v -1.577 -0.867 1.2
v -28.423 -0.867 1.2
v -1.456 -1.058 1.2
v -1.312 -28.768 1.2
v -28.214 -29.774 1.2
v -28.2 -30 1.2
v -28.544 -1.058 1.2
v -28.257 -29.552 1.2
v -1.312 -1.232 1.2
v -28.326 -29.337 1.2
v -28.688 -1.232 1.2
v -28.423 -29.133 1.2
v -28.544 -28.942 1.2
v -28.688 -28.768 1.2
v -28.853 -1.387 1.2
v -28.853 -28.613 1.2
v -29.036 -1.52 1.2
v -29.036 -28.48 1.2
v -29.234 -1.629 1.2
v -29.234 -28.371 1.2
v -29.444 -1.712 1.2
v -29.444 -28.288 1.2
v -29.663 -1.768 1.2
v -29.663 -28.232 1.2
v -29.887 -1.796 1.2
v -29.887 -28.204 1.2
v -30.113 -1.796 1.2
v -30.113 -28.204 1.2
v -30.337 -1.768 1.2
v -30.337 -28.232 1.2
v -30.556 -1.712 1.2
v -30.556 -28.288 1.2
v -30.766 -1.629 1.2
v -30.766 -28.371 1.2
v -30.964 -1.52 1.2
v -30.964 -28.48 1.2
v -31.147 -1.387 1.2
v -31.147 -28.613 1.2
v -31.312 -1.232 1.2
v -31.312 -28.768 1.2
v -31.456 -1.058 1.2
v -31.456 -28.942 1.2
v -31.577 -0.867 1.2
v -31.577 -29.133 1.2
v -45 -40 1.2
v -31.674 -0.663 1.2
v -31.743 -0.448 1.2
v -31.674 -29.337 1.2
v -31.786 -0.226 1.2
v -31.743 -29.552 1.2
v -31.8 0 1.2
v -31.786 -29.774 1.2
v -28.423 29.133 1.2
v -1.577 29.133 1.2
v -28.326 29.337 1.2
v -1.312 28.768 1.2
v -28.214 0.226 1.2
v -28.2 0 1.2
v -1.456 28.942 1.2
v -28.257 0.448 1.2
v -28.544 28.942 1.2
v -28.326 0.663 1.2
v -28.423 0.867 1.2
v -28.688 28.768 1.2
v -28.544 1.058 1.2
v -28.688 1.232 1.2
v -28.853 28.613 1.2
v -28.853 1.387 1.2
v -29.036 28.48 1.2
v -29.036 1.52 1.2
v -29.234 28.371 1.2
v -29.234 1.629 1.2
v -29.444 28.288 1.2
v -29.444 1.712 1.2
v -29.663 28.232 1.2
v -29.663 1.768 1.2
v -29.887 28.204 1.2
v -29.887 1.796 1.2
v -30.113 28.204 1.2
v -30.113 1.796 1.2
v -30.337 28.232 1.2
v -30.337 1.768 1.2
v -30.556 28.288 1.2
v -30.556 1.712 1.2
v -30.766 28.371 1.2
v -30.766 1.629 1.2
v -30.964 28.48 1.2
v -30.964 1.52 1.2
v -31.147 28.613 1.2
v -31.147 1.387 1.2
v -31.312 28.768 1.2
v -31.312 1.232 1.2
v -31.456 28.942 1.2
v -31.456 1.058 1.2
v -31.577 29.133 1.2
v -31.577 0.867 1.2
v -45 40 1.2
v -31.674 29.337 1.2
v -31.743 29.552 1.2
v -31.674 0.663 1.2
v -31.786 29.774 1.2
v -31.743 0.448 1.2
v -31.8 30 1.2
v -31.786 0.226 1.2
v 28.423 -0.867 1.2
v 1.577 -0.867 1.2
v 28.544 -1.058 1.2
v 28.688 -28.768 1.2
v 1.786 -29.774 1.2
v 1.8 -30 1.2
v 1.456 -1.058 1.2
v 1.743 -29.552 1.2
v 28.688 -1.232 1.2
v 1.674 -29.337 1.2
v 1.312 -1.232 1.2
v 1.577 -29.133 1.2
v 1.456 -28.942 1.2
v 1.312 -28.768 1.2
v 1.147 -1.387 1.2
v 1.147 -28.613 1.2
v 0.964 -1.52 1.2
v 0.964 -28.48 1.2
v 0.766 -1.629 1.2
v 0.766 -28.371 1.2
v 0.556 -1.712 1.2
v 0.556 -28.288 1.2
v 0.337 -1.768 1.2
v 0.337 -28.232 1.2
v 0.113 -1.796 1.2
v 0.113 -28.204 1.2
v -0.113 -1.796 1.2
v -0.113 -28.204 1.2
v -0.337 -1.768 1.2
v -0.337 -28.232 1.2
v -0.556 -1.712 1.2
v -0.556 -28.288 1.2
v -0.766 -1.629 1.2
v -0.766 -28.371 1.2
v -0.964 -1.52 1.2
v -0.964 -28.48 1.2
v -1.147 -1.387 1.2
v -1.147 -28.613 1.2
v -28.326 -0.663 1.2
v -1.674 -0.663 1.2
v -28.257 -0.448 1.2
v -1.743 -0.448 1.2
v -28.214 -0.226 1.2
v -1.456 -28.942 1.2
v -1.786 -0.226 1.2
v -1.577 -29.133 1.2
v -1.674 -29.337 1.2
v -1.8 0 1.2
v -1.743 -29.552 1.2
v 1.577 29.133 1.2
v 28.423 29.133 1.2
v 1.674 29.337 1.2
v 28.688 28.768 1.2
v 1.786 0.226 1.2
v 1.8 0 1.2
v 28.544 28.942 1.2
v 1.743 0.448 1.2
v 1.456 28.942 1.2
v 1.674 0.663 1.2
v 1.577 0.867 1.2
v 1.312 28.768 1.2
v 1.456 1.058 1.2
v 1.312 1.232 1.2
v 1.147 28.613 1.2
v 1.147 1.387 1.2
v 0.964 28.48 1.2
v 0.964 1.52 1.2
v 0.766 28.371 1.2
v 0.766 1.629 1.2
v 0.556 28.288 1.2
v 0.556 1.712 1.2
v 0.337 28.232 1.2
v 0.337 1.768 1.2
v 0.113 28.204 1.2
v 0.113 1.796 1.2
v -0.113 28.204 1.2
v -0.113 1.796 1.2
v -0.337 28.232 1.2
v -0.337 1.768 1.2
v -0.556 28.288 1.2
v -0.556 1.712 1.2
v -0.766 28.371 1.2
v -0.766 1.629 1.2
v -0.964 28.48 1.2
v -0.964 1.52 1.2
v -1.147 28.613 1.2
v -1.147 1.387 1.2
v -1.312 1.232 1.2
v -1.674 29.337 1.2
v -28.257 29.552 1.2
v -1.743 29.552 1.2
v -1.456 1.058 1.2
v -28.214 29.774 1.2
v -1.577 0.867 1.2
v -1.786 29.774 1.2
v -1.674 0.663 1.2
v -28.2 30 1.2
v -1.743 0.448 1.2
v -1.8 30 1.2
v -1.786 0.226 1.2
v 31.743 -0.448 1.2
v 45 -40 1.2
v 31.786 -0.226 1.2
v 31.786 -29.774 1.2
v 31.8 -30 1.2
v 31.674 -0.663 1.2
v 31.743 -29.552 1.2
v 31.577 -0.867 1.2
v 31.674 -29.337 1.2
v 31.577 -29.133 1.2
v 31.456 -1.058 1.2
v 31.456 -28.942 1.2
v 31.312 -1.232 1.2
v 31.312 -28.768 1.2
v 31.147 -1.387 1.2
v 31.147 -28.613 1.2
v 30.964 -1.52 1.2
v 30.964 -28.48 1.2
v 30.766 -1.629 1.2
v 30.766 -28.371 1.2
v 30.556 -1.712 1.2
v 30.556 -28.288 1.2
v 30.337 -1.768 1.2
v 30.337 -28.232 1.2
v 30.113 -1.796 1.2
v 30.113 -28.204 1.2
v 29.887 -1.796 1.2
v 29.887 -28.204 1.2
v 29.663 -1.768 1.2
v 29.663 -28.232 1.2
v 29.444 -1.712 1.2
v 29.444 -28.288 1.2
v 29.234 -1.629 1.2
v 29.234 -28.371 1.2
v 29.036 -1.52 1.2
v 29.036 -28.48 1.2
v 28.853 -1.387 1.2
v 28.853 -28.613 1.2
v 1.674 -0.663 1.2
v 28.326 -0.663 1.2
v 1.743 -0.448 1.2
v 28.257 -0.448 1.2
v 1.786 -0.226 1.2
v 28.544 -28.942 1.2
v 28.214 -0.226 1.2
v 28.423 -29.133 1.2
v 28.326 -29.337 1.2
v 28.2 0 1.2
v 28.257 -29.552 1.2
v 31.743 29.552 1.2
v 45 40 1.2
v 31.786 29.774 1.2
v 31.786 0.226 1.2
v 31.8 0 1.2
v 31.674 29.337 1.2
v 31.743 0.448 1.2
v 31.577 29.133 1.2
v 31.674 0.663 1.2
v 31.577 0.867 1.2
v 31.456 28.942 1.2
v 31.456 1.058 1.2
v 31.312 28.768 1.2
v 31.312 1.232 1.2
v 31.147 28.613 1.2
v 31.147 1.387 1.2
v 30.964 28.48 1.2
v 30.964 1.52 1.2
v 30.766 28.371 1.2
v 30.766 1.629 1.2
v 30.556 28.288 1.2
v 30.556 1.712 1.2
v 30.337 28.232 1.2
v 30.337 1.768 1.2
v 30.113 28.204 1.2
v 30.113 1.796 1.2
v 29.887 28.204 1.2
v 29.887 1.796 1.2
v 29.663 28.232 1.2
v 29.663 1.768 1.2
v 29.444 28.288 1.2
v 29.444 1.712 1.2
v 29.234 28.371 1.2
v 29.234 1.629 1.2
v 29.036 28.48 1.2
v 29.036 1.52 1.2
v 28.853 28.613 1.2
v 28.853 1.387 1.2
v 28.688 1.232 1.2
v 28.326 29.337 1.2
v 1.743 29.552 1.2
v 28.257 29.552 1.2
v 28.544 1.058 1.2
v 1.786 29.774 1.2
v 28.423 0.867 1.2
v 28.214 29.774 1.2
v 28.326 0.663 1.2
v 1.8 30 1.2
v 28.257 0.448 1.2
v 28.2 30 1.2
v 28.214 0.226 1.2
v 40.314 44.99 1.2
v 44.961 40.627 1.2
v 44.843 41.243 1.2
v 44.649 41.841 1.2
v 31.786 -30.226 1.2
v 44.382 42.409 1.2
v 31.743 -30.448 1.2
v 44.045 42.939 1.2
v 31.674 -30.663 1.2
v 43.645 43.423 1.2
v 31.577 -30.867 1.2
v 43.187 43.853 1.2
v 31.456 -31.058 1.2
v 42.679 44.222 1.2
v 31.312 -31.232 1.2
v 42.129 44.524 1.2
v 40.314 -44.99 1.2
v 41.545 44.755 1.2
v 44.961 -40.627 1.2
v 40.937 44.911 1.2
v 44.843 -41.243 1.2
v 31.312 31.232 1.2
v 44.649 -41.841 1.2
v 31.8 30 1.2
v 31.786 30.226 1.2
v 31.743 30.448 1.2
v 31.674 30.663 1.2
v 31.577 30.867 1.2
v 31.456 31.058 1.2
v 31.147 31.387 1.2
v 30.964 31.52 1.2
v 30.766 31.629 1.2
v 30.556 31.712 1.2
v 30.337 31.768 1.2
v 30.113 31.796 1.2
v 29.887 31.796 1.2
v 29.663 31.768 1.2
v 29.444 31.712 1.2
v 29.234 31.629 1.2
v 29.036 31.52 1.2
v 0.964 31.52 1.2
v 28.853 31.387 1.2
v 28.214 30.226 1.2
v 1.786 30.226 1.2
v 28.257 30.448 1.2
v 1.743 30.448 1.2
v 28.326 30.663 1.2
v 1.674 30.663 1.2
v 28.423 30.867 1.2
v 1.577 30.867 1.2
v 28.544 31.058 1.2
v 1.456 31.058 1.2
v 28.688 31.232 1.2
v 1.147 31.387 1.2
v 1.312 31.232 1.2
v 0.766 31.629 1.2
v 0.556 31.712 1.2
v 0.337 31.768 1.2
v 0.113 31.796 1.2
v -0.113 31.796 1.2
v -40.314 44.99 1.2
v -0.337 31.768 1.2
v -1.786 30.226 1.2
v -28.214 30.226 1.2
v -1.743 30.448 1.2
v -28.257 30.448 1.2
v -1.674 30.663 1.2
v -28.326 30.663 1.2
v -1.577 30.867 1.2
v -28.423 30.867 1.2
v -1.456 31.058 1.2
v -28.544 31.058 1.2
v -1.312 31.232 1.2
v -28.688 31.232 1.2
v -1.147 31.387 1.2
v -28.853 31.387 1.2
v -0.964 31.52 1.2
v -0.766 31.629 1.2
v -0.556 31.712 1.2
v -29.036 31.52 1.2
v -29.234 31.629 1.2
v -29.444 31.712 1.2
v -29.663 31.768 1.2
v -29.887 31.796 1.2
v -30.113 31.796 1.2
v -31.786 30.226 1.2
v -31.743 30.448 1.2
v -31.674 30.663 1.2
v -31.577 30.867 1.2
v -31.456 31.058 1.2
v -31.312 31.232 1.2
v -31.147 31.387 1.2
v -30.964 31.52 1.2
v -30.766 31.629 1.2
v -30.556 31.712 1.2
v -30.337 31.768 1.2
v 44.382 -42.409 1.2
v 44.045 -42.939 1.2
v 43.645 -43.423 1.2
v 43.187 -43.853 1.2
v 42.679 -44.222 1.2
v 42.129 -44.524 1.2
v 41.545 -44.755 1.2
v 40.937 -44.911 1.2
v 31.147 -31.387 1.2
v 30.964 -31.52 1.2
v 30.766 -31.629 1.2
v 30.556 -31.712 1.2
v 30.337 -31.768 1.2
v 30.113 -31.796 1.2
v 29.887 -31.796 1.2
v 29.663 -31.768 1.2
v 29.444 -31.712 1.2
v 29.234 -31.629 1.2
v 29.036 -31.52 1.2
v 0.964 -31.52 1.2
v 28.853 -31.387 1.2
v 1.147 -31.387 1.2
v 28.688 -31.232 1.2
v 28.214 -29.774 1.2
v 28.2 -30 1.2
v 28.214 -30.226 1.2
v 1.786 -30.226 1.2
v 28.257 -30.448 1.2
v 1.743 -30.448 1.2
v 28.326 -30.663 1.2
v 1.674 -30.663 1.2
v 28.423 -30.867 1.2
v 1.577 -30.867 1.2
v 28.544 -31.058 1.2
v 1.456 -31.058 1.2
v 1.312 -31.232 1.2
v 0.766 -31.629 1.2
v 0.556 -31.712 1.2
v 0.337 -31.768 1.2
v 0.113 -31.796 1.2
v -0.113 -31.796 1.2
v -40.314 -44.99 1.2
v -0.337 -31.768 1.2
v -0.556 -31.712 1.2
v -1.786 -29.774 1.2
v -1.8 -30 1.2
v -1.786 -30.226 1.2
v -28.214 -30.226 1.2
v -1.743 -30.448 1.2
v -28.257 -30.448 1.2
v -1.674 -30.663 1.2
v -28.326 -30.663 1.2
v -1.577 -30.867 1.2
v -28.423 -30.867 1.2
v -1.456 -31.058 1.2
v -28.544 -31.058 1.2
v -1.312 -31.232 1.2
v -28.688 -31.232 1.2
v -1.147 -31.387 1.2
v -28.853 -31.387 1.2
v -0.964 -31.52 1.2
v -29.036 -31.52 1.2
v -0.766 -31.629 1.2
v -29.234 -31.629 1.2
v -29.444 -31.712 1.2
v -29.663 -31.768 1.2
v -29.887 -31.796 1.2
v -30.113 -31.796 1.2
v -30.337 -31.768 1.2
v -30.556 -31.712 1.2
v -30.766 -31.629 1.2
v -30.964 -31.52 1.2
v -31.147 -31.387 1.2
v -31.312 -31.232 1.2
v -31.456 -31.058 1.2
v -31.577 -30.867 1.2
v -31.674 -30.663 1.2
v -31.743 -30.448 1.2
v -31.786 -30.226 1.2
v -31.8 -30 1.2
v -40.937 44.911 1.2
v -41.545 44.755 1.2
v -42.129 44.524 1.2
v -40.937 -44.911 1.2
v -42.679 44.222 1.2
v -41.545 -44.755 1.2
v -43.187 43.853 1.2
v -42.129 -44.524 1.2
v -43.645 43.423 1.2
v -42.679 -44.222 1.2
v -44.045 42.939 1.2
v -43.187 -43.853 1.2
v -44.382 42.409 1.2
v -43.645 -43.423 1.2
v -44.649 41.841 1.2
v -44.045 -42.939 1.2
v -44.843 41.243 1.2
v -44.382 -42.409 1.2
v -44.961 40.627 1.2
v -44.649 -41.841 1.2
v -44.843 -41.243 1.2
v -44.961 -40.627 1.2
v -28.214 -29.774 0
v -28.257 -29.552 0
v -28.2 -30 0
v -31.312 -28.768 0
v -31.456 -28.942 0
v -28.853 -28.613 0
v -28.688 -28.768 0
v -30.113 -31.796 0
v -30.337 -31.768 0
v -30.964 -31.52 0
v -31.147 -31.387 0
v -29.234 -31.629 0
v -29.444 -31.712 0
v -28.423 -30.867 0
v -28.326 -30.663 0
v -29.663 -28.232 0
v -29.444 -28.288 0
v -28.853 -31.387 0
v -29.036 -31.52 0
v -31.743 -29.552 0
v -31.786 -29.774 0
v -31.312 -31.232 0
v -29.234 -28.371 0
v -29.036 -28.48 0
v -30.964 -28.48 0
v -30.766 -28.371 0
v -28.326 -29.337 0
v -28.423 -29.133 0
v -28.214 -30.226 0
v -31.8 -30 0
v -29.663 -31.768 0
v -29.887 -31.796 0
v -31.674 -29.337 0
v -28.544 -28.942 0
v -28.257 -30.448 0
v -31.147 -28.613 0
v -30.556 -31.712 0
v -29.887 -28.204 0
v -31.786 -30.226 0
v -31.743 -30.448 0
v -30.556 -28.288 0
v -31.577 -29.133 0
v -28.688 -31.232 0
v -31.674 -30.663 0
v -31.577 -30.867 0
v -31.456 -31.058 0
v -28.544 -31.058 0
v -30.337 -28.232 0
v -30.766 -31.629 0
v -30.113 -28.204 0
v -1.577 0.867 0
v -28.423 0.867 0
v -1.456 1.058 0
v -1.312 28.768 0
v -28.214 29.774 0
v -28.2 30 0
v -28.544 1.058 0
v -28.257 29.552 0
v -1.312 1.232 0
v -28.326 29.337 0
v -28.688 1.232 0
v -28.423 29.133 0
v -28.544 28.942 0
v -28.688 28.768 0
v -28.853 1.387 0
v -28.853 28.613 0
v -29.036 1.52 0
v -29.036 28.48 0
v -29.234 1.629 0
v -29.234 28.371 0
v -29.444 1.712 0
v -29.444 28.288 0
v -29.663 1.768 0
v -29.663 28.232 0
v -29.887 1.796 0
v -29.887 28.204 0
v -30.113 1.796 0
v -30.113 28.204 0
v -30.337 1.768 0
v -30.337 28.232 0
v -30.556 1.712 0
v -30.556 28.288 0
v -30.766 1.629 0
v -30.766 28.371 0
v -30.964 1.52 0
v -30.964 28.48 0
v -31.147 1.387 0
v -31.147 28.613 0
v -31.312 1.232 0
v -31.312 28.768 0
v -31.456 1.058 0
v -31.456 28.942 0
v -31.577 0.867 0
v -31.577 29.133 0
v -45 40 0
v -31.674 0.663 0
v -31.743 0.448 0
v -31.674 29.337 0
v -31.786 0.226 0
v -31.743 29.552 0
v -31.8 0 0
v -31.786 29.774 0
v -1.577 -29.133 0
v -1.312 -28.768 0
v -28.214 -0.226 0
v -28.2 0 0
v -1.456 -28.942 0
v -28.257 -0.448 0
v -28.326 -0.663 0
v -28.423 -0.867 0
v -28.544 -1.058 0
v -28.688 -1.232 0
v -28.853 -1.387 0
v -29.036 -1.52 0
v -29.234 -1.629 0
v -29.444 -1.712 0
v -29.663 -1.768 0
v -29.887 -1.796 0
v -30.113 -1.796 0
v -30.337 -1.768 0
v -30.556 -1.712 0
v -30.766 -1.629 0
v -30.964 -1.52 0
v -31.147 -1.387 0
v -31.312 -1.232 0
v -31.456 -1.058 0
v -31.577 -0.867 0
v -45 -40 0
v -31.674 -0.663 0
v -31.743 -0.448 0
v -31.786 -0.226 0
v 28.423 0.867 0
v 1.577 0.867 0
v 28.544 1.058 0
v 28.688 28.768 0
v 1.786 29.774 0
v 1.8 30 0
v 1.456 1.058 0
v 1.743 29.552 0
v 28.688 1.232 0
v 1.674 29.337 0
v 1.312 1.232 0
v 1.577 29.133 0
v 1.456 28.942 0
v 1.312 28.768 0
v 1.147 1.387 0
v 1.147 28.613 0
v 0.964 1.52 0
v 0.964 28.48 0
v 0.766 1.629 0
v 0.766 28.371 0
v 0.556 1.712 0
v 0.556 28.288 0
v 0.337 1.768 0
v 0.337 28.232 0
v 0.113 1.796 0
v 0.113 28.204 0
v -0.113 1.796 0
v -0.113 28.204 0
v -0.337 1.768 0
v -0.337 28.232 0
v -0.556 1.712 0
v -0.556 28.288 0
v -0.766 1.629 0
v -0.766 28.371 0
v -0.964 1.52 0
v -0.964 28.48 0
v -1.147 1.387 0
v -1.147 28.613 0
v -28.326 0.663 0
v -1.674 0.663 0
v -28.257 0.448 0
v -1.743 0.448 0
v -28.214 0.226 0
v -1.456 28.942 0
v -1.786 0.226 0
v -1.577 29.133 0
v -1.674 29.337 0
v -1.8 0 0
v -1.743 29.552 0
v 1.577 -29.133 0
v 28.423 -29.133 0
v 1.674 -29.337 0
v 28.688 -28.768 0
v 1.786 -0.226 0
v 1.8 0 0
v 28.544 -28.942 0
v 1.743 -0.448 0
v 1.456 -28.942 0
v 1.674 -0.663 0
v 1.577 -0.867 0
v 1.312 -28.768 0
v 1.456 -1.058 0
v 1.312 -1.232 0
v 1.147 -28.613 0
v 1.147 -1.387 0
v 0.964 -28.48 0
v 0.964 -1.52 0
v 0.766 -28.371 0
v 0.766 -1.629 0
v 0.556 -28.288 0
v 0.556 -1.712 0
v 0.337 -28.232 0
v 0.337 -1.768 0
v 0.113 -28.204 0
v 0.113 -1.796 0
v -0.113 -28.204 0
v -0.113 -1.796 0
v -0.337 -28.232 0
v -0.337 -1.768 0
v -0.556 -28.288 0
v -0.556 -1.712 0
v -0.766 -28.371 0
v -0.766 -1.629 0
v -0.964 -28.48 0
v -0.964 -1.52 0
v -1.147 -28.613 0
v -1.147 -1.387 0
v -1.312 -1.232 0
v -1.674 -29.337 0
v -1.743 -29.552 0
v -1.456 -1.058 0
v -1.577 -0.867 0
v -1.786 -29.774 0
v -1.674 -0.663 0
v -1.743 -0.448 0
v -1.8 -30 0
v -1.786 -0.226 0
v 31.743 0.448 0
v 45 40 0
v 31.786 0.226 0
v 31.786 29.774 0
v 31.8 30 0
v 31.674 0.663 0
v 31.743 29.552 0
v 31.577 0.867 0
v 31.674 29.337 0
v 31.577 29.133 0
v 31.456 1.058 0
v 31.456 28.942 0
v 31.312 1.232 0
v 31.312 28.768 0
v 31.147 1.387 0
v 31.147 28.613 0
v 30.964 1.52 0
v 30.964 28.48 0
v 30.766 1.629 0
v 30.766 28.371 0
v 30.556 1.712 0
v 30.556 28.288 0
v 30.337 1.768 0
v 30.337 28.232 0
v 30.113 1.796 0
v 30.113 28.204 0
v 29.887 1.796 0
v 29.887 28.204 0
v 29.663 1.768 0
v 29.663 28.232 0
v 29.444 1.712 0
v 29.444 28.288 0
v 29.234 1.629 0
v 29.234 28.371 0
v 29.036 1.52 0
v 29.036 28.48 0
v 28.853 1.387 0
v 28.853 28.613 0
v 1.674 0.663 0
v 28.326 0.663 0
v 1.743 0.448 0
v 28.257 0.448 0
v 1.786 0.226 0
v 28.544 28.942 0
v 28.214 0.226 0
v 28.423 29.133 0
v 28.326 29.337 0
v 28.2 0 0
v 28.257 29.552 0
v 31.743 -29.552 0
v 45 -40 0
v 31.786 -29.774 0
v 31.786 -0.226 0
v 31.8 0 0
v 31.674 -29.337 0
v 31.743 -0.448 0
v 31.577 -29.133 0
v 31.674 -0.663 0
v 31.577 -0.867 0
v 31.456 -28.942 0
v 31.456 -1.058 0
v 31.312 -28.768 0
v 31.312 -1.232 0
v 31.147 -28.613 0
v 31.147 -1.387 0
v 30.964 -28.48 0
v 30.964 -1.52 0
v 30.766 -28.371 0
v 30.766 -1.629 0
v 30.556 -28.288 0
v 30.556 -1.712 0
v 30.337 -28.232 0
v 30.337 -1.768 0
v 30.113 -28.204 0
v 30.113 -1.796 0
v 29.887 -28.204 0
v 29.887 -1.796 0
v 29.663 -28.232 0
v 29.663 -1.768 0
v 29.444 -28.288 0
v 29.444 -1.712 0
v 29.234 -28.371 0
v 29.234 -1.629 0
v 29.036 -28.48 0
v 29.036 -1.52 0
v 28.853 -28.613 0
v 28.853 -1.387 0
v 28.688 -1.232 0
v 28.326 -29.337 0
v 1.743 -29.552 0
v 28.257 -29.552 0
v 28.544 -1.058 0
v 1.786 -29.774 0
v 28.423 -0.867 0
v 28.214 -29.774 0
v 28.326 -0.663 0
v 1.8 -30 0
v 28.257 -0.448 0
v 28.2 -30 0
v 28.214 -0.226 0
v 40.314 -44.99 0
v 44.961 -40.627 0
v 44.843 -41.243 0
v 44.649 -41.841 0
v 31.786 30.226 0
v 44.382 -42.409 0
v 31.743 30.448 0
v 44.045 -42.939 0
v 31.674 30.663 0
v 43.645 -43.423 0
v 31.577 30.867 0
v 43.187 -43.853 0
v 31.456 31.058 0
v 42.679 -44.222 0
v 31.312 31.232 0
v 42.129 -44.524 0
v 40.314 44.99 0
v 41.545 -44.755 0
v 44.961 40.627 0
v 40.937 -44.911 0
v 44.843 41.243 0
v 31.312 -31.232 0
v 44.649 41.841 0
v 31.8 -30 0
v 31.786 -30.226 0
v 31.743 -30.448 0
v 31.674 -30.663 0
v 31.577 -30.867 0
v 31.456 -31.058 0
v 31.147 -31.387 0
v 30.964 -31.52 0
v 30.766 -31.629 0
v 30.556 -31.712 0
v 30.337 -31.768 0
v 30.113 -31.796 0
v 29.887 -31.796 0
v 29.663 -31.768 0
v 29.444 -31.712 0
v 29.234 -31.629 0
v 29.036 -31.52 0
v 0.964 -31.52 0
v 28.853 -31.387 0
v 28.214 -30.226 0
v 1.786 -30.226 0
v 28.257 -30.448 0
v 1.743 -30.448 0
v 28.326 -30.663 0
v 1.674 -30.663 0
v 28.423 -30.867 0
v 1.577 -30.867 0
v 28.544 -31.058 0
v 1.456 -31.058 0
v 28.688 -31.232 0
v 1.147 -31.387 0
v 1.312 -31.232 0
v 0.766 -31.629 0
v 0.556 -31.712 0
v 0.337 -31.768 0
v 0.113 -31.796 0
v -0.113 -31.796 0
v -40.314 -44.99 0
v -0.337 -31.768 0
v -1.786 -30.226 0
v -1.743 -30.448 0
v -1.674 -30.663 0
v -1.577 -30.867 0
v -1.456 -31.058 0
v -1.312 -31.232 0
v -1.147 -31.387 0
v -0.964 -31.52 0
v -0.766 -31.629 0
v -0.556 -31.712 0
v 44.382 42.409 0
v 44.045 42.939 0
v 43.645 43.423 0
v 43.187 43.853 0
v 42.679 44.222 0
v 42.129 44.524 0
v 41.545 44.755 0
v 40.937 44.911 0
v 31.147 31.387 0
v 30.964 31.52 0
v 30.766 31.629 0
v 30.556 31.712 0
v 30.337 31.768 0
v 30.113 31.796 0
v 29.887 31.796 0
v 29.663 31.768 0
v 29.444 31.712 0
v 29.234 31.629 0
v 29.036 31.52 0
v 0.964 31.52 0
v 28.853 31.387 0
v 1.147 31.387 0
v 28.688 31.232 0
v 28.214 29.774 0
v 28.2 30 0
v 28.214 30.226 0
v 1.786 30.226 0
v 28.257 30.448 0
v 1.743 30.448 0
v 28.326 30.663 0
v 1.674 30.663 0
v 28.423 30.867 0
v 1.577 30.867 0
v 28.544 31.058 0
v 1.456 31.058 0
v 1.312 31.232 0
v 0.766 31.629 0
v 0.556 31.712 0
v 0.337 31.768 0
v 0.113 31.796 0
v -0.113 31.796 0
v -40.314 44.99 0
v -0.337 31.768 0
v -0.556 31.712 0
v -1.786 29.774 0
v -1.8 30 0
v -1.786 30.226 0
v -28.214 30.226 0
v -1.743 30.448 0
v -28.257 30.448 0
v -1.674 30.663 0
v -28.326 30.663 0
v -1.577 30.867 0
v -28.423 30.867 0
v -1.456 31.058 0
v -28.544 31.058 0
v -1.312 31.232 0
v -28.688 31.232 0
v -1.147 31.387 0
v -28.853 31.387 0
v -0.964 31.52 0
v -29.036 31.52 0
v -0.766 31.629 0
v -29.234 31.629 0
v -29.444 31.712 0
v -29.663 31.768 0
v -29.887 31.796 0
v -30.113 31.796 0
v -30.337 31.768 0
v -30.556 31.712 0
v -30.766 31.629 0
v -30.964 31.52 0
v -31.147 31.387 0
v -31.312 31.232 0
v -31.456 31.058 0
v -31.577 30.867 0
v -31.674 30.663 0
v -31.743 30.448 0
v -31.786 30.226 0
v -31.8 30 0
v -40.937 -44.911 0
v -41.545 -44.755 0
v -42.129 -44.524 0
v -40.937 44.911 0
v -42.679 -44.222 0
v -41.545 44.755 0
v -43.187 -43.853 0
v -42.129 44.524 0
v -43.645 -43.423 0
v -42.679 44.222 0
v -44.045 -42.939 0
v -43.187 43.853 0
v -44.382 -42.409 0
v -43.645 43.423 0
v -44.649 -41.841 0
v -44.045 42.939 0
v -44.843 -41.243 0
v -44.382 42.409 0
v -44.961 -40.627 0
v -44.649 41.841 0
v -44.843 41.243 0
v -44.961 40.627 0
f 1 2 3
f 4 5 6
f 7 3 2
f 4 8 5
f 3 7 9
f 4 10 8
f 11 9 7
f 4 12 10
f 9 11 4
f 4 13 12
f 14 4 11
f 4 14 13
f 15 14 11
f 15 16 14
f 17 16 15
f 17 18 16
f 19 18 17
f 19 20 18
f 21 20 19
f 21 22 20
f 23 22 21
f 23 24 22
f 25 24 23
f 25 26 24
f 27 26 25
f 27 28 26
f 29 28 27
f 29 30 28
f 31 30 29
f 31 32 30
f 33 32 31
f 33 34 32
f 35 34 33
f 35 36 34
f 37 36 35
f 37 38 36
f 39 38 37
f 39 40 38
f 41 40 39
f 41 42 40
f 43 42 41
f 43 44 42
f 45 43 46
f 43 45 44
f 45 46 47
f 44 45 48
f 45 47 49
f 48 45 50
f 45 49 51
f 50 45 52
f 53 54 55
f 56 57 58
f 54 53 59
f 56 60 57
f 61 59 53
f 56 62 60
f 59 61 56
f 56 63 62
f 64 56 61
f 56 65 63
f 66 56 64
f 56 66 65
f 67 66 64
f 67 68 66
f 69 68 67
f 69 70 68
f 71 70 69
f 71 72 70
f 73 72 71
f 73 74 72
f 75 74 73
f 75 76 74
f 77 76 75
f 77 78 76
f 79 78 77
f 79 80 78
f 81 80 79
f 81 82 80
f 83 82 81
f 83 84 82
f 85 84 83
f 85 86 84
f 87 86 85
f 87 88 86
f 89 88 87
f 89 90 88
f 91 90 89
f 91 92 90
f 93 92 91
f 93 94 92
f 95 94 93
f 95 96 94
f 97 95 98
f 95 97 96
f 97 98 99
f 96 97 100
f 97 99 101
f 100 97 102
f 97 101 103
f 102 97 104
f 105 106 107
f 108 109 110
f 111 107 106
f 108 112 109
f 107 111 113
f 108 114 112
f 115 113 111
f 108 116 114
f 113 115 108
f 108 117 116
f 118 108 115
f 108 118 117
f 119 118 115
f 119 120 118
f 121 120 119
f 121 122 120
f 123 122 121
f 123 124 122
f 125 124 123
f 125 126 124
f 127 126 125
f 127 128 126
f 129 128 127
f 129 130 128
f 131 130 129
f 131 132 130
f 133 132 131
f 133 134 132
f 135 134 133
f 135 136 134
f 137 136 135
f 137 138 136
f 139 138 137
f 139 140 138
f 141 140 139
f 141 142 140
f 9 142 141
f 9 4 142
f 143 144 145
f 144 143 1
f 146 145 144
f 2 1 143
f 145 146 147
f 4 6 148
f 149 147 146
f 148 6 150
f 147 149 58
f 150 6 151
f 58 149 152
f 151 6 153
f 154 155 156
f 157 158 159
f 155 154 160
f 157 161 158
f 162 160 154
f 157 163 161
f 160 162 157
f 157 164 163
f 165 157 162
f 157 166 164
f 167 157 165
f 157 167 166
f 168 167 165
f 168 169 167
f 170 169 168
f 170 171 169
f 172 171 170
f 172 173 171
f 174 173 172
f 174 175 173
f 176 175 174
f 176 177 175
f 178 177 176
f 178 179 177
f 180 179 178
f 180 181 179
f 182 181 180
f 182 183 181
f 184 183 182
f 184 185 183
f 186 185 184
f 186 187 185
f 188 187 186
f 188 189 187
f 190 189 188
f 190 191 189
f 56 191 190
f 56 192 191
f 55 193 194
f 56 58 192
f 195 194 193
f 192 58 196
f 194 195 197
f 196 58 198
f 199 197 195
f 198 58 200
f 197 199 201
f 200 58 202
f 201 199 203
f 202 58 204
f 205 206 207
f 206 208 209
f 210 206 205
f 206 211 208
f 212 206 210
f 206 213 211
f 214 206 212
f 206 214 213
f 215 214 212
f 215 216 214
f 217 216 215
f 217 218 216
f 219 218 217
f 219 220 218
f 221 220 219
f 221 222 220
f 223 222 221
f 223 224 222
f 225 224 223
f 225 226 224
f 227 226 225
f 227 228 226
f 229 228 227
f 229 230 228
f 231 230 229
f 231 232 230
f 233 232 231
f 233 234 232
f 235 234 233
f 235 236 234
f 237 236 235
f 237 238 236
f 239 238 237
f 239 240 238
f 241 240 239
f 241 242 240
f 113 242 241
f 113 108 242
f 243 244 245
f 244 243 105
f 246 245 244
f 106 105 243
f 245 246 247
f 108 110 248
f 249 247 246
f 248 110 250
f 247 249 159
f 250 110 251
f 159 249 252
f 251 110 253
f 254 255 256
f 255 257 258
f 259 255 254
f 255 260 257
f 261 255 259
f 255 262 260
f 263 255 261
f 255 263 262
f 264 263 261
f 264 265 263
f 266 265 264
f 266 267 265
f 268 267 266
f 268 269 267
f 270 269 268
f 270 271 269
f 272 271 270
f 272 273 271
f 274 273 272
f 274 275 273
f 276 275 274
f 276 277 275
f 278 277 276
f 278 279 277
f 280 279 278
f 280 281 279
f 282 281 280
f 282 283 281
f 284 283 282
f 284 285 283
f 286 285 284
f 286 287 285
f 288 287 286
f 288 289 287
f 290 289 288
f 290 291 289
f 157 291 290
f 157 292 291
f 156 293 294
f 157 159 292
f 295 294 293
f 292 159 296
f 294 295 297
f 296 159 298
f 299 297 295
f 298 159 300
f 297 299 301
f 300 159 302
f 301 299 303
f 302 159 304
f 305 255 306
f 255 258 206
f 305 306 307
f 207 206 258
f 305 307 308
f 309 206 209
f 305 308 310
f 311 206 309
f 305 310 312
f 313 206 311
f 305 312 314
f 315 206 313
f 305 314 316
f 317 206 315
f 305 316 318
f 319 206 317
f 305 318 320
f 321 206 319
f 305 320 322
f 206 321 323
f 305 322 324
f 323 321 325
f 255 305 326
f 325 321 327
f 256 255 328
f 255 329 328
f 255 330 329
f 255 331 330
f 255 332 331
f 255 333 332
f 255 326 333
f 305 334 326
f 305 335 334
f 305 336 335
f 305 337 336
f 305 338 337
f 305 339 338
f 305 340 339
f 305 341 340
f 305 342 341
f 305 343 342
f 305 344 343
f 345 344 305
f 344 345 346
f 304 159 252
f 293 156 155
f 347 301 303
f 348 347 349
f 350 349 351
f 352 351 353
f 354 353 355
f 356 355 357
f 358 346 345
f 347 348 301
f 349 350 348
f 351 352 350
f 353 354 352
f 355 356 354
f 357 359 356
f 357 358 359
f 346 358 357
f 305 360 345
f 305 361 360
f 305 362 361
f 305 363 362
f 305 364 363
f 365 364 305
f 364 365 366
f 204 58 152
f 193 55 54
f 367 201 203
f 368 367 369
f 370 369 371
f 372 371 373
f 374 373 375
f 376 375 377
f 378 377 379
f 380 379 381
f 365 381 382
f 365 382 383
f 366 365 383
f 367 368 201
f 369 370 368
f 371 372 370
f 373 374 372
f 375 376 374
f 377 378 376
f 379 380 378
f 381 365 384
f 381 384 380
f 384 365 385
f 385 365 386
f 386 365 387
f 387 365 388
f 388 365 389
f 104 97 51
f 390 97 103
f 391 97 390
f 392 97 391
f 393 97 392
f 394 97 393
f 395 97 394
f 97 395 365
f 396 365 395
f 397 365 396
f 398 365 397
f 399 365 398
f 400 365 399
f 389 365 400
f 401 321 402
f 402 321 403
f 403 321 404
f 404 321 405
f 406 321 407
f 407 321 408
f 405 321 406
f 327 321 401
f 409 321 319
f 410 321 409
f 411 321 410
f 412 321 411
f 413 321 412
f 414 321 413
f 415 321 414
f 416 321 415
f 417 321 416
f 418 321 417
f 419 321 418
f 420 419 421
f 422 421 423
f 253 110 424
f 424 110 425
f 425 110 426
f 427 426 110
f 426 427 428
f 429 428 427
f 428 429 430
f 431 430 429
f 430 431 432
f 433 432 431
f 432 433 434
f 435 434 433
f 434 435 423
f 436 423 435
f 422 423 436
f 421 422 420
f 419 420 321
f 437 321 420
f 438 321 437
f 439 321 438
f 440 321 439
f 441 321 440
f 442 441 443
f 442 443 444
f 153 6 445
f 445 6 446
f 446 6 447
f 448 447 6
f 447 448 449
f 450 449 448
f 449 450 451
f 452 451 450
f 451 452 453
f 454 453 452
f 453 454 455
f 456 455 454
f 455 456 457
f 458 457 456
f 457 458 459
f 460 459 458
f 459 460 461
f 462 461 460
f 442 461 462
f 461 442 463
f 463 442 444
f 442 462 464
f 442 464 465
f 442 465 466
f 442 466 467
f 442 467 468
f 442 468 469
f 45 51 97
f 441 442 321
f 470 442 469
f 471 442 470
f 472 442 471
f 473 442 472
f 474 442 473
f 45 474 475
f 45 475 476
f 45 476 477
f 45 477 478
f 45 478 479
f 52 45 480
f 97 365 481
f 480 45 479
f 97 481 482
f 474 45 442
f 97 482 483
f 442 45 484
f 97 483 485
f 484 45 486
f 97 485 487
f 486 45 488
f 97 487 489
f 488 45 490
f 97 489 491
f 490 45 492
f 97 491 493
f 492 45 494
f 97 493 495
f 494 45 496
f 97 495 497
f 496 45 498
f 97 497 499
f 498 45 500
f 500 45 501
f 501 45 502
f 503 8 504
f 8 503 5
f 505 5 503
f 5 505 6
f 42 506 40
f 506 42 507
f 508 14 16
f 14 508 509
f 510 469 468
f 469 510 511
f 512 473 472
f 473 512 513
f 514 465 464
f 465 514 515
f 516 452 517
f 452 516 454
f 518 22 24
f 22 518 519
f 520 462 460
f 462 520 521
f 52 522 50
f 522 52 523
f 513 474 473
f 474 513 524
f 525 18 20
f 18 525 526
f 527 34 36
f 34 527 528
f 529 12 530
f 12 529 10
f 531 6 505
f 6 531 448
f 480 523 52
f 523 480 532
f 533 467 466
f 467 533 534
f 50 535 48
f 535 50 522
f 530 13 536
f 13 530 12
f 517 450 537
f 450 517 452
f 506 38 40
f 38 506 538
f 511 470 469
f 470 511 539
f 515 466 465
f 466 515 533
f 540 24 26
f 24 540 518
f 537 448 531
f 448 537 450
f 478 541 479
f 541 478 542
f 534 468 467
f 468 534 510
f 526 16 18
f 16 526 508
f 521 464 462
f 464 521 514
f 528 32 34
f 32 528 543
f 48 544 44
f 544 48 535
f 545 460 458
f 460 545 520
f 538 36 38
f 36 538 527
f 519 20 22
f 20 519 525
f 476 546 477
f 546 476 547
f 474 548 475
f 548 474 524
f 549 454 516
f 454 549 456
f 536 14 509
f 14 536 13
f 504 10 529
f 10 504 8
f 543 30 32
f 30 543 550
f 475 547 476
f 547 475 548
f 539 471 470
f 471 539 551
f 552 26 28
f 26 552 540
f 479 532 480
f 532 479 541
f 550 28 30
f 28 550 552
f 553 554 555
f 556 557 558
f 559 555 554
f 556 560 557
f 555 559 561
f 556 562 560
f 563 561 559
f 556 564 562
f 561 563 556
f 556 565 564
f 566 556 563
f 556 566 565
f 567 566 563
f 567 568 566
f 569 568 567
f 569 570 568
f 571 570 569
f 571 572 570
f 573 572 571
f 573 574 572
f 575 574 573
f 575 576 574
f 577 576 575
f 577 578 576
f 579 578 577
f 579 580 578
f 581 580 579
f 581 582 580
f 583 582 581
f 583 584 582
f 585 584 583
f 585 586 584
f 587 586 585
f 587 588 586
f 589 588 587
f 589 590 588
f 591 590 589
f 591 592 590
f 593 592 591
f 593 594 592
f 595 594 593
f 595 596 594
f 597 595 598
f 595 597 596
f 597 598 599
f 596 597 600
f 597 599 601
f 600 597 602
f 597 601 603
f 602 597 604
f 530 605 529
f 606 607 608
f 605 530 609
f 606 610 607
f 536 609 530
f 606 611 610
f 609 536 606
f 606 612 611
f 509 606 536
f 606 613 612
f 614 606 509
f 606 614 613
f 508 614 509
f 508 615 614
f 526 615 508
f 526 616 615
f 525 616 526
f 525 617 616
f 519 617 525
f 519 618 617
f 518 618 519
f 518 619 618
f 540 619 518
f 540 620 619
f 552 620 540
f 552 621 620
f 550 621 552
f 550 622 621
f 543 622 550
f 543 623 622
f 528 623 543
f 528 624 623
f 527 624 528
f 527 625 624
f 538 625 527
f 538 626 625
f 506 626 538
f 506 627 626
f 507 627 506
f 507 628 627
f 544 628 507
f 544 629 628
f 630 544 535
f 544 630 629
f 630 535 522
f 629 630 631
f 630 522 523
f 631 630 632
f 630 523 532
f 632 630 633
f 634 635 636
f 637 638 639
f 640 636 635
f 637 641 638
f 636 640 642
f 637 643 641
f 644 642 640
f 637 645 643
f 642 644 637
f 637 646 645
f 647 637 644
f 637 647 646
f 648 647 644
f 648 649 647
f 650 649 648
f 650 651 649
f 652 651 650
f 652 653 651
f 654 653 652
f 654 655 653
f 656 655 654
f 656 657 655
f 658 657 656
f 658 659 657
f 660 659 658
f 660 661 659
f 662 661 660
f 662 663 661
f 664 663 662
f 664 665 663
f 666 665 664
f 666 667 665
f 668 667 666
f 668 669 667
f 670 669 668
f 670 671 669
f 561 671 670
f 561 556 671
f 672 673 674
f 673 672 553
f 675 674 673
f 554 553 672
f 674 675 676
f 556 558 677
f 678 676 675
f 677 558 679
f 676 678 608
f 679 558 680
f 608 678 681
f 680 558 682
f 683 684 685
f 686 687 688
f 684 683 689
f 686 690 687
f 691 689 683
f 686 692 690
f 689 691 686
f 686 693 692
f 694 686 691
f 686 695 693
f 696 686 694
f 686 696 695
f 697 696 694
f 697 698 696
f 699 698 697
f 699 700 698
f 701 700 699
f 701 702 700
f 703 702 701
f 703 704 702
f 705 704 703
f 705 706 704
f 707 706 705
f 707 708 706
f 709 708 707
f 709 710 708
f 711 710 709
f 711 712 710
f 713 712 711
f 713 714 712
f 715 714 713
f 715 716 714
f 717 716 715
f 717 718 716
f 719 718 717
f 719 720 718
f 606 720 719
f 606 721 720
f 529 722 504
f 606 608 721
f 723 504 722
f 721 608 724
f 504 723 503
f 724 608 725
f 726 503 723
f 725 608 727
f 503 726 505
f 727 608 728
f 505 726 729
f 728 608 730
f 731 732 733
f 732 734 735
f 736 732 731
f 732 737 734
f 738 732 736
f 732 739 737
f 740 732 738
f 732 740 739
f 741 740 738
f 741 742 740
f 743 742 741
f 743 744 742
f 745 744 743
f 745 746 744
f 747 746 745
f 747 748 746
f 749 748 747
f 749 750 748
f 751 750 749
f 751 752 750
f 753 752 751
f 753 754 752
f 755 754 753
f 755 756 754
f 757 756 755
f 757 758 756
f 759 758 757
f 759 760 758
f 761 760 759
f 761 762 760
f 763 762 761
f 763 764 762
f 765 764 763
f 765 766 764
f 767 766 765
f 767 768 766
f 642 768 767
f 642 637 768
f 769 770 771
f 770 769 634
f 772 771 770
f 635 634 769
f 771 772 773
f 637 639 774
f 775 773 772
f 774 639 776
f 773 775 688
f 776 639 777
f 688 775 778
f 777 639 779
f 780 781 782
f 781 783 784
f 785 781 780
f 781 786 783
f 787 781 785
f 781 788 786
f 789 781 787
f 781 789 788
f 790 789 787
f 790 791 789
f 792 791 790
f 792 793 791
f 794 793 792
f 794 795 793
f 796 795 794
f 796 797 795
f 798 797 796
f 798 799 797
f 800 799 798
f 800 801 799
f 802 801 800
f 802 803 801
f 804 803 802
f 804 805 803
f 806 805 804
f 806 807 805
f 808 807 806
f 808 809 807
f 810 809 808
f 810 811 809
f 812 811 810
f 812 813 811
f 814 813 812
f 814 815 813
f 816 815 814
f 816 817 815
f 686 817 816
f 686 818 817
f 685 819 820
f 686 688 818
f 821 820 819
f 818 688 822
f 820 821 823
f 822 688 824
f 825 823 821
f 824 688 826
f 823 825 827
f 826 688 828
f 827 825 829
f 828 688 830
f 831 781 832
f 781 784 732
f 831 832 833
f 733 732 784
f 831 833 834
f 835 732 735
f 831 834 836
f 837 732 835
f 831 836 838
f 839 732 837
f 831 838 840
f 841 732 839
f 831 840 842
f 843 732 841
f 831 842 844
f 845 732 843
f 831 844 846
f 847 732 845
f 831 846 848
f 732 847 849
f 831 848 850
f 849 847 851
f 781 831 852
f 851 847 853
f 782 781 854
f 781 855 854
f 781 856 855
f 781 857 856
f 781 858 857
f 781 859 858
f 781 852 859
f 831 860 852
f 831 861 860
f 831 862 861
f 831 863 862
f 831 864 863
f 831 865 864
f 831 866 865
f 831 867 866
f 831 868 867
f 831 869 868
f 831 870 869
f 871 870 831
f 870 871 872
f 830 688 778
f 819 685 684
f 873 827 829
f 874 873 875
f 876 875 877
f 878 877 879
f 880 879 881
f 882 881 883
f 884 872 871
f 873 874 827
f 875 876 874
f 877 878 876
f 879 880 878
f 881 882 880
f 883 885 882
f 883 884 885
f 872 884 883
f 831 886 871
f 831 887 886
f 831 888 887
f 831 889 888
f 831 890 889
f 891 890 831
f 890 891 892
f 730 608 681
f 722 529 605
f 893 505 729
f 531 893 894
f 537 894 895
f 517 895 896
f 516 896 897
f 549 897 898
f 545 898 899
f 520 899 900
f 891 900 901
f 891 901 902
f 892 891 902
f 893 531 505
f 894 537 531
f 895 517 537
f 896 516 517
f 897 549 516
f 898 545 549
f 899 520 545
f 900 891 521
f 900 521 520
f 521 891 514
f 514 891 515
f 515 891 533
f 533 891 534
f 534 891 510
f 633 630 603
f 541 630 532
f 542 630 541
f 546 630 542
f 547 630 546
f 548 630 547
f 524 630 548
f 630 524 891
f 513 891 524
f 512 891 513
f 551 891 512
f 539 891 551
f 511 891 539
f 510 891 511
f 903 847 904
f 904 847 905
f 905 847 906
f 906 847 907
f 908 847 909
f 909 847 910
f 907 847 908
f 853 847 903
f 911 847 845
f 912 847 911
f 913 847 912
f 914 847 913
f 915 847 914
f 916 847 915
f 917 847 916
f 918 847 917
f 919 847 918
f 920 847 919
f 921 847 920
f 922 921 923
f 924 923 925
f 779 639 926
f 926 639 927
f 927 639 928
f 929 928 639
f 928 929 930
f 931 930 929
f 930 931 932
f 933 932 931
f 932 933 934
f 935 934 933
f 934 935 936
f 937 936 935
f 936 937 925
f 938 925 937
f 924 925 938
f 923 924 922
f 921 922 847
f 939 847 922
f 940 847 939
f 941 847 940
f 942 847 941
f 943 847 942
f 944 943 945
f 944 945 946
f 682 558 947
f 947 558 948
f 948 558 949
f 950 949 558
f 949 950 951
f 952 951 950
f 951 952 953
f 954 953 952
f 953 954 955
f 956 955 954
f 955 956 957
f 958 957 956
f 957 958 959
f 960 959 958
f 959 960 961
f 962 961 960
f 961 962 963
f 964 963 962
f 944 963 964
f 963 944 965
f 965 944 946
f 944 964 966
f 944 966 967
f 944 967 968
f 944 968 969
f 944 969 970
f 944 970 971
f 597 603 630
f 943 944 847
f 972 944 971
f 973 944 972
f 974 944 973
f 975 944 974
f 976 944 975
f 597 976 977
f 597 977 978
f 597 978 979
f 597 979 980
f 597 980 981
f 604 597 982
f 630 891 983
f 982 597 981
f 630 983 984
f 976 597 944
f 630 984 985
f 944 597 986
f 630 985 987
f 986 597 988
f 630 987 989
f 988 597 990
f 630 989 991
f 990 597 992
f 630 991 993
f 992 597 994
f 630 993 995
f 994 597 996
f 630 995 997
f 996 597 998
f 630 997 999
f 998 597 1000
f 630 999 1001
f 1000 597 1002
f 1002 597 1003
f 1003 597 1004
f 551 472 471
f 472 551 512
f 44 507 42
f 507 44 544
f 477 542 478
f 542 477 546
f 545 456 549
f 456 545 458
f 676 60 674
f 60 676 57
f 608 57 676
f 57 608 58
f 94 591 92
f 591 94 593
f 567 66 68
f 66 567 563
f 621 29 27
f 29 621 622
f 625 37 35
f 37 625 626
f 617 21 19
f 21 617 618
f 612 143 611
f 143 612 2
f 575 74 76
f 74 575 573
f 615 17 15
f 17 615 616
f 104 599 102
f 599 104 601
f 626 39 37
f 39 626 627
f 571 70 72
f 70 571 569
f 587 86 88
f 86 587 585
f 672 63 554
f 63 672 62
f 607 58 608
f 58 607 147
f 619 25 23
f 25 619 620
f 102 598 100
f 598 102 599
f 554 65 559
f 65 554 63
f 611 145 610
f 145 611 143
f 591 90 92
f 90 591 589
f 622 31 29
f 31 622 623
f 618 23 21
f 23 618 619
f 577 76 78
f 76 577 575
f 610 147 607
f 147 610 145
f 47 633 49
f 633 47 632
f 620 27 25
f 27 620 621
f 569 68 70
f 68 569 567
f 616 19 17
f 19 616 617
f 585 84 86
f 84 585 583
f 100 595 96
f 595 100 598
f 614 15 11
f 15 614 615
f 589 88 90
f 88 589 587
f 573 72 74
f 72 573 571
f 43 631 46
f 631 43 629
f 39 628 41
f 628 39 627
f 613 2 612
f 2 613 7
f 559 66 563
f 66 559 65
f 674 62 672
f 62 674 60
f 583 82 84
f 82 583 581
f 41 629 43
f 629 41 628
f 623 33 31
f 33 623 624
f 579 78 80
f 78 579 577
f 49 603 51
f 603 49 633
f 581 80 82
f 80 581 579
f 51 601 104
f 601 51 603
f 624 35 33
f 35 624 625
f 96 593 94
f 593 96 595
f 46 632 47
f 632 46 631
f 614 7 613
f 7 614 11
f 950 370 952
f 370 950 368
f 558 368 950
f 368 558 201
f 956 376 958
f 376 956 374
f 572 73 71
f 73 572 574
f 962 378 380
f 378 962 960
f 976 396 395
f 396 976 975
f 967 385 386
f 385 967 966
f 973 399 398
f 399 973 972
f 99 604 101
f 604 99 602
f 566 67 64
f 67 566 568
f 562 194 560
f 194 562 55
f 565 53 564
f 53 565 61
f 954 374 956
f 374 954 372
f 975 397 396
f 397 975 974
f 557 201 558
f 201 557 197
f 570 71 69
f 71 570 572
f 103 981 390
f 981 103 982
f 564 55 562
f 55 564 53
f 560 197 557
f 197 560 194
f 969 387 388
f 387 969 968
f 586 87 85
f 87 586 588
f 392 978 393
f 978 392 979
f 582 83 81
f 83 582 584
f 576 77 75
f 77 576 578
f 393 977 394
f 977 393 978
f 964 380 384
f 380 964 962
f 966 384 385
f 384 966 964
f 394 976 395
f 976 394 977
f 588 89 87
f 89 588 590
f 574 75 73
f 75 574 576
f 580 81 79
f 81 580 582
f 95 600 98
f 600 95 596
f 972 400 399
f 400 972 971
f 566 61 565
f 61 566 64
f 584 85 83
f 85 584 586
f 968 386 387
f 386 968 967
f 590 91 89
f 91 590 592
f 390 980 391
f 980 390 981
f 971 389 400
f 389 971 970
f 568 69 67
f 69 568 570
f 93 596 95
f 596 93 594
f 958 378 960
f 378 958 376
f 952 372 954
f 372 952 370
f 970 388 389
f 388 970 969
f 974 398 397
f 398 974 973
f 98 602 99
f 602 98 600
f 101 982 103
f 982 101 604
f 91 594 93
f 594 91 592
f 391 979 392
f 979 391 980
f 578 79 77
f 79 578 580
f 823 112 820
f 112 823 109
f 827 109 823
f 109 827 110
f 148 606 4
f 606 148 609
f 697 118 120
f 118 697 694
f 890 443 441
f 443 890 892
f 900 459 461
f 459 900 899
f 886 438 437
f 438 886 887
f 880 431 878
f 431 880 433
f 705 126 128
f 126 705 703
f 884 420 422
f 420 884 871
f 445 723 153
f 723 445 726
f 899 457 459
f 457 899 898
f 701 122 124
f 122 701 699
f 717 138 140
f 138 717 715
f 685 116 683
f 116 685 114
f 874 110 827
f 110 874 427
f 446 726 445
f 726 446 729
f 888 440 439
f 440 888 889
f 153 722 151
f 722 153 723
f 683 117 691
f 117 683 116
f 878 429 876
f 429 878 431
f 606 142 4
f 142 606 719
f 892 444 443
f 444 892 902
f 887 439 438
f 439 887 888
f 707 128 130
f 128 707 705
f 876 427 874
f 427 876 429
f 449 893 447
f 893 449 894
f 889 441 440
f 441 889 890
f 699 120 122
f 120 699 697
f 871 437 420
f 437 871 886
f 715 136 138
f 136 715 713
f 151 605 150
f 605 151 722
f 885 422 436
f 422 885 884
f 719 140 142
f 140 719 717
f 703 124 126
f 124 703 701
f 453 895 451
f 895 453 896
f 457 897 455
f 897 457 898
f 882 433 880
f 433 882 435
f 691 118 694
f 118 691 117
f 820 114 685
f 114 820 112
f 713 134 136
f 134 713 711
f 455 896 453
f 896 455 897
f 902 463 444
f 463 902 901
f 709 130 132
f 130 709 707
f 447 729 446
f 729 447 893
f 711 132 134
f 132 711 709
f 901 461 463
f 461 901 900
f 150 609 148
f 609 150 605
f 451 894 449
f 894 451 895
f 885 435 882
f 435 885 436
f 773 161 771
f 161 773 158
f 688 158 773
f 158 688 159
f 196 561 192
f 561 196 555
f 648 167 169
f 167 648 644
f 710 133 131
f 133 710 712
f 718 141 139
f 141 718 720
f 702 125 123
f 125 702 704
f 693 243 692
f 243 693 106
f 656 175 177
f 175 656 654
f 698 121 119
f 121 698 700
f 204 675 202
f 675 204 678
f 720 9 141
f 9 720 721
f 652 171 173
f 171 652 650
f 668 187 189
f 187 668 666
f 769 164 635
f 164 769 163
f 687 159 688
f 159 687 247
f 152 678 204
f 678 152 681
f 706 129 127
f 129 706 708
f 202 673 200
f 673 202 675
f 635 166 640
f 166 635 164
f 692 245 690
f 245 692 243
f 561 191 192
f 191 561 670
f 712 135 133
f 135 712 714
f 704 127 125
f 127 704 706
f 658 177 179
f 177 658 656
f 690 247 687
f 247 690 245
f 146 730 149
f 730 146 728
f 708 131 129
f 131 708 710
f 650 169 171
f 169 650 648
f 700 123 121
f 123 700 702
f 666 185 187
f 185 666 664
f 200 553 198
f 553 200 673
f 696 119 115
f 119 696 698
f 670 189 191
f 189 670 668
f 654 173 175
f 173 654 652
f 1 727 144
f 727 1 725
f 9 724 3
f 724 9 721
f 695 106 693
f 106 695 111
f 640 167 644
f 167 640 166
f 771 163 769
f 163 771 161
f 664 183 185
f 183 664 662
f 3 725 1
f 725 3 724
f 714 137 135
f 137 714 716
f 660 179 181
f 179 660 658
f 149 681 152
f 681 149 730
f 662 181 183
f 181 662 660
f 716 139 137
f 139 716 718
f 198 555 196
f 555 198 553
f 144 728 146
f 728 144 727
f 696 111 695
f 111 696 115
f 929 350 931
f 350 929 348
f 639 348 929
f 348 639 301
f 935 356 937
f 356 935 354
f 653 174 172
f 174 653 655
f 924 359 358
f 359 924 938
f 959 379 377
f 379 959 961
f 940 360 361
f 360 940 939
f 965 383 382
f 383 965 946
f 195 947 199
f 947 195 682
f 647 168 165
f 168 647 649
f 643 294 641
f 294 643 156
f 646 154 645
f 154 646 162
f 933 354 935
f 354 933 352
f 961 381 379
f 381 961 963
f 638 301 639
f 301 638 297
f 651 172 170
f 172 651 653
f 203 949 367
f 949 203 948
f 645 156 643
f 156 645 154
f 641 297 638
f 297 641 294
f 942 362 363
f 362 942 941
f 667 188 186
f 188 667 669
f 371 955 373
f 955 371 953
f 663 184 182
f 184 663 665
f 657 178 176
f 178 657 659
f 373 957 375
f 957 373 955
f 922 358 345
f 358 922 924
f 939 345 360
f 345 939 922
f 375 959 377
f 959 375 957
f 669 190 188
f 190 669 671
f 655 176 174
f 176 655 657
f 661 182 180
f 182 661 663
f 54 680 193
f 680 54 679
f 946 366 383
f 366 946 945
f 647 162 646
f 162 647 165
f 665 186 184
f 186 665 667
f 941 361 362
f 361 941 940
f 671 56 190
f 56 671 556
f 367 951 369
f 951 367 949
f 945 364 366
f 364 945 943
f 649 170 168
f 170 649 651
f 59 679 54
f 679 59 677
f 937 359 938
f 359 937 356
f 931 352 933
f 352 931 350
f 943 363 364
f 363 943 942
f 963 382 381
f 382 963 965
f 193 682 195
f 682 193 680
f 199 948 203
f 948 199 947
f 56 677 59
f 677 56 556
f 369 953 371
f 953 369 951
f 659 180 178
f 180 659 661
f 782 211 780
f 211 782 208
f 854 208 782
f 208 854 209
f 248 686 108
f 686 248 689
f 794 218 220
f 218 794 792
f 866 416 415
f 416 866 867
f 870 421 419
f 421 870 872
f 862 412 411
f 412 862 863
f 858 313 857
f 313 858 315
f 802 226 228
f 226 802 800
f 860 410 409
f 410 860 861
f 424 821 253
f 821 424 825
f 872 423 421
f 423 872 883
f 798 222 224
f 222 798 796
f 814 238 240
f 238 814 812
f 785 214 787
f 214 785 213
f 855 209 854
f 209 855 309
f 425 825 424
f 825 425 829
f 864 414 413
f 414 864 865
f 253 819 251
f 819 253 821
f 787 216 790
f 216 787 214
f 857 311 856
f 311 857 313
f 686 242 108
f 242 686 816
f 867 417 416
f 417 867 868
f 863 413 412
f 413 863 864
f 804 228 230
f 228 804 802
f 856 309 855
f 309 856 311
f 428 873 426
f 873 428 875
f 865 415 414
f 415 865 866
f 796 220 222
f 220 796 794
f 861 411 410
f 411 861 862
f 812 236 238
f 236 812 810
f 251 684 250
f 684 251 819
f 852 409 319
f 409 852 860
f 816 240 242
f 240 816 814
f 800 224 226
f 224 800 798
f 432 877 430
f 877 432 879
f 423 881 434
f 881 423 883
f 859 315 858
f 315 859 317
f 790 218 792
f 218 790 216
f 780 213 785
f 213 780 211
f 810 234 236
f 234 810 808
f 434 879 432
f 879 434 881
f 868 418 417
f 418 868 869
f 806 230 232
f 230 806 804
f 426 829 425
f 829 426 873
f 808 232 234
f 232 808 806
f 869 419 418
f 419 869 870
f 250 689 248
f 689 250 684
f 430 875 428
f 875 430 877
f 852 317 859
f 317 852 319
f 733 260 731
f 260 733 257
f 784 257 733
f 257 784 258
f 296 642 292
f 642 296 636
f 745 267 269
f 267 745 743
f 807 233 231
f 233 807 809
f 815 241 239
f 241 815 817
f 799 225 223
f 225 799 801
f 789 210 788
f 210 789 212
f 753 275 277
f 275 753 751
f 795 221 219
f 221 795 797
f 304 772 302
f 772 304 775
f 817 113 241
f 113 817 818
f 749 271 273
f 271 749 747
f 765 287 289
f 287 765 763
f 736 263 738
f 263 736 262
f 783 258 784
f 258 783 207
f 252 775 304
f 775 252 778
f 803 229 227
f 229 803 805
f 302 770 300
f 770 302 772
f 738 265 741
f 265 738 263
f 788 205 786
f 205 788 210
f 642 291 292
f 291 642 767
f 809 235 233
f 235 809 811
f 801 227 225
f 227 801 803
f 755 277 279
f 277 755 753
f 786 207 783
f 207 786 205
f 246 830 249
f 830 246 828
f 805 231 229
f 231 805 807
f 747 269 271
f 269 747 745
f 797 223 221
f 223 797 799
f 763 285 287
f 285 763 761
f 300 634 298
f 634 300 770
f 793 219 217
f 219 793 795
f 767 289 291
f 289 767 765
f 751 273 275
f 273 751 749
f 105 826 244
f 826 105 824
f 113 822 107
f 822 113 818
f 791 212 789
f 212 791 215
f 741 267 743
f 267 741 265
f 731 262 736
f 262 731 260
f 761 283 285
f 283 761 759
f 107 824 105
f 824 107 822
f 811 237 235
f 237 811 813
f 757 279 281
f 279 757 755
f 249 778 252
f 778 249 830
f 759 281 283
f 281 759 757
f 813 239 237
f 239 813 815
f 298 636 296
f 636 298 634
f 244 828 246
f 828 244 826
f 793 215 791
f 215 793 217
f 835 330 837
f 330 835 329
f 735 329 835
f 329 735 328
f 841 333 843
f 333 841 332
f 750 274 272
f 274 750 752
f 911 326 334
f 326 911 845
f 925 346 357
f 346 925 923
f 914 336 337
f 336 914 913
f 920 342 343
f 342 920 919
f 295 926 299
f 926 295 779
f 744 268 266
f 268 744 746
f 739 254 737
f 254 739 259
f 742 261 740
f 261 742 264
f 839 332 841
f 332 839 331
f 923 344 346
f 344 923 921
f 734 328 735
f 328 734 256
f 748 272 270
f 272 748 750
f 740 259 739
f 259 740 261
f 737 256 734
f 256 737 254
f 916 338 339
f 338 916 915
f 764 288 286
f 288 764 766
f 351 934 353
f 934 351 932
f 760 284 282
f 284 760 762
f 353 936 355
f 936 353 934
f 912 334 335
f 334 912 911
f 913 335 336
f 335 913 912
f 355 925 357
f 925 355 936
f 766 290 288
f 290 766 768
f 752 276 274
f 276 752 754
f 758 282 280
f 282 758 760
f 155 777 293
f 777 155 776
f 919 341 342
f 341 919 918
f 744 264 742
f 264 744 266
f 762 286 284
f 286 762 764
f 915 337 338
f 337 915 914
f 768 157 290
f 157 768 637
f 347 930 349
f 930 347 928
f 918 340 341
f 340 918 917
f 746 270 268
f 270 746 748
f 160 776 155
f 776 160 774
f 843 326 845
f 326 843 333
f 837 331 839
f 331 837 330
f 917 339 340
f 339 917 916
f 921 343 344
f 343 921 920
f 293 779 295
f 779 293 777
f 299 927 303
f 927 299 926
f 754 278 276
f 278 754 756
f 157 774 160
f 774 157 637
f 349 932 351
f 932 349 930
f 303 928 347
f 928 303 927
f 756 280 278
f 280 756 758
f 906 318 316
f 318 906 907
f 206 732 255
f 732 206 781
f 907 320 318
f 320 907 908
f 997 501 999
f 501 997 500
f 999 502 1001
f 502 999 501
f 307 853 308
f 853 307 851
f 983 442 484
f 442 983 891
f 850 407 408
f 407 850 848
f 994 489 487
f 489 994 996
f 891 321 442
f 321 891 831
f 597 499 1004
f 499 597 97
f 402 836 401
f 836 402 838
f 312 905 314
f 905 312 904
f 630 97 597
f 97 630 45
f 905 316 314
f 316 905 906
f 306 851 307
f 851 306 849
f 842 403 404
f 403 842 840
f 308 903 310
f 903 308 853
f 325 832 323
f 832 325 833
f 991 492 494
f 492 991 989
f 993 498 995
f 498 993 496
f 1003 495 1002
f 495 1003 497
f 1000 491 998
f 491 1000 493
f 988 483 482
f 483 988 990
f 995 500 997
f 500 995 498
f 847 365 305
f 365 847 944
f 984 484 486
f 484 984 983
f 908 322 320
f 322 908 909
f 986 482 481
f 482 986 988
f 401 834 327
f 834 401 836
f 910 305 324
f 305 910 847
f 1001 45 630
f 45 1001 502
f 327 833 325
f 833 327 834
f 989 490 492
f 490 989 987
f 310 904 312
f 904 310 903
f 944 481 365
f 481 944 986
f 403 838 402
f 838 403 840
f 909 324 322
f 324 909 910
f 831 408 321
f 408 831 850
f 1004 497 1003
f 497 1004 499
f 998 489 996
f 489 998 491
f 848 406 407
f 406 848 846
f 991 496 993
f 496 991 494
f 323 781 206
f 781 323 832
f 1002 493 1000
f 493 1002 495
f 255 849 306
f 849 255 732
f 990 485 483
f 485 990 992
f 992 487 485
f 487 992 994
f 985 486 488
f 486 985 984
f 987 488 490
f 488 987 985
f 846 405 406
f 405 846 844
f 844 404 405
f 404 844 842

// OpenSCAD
$fn = 50;


difference() {
	union() {
		hull() {
			translate(v = [-40.0000000000, 40.0000000000, 0]) {
				cylinder(h = 45, r = 5);
			}
			translate(v = [40.0000000000, 40.0000000000, 0]) {
				cylinder(h = 45, r = 5);
			}
			translate(v = [-40.0000000000, -40.0000000000, 0]) {
				cylinder(h = 45, r = 5);
			}
			translate(v = [40.0000000000, -40.0000000000, 0]) {
				cylinder(h = 45, r = 5);
			}
		}
	}
	union() {
		translate(v = [0, 0, 1.2000000000]) {
			hull() {
				translate(v = [-40.0000000000, 40.0000000000, 0]) {
					cylinder(h = 43.8000000000, r = 3.8000000000);
				}
				translate(v = [40.0000000000, 40.0000000000, 0]) {
					cylinder(h = 43.8000000000, r = 3.8000000000);
				}
				translate(v = [-40.0000000000, -40.0000000000, 0]) {
					cylinder(h = 43.8000000000, r = 3.8000000000);
				}
				translate(v = [40.0000000000, -40.0000000000, 0]) {
					cylinder(h = 43.8000000000, r = 3.8000000000);
				}
			}
		}
		#translate(v = [-30.0000000000, -30.0000000000, 0]) {
			cylinder(h = 1.2000000000, r = 1.8000000000);
		}
		#translate(v = [-30.0000000000, 0.0000000000, 0]) {
			cylinder(h = 1.2000000000, r = 1.8000000000);
		}
		#translate(v = [-30.0000000000, 30.0000000000, 0]) {
			cylinder(h = 1.2000000000, r = 1.8000000000);
		}
		#translate(v = [0.0000000000, -30.0000000000, 0]) {
			cylinder(h = 1.2000000000, r = 1.8000000000);
		}
		#cylinder(h = 1.2000000000, r = 1.8000000000);
		#translate(v = [0.0000000000, 30.0000000000, 0]) {
			cylinder(h = 1.2000000000, r = 1.8000000000);
		}
		#translate(v = [30.0000000000, -30.0000000000, 0]) {
			cylinder(h = 1.2000000000, r = 1.8000000000);
		}
		#translate(v = [30.0000000000, 0.0000000000, 0]) {
			cylinder(h = 1.2000000000, r = 1.8000000000);
		}
		#translate(v = [30.0000000000, 30.0000000000, 0]) {
			cylinder(h = 1.2000000000, r = 1.8000000000);
		}
		translate(v = [-250.0000000000, -250.0000000000, 1.2000000000]) {
			cube(size = [500, 500, 500]);
		}
		translate(v = [-250.0000000000, -250.0000000000, 1.2000000000]) {
			cube(size = [500, 500, 500]);
		}
		translate(v = [-250.0000000000, -250.0000000000, 1.2000000000]) {
			cube(size = [500, 500, 500]);
		}
	}
}
